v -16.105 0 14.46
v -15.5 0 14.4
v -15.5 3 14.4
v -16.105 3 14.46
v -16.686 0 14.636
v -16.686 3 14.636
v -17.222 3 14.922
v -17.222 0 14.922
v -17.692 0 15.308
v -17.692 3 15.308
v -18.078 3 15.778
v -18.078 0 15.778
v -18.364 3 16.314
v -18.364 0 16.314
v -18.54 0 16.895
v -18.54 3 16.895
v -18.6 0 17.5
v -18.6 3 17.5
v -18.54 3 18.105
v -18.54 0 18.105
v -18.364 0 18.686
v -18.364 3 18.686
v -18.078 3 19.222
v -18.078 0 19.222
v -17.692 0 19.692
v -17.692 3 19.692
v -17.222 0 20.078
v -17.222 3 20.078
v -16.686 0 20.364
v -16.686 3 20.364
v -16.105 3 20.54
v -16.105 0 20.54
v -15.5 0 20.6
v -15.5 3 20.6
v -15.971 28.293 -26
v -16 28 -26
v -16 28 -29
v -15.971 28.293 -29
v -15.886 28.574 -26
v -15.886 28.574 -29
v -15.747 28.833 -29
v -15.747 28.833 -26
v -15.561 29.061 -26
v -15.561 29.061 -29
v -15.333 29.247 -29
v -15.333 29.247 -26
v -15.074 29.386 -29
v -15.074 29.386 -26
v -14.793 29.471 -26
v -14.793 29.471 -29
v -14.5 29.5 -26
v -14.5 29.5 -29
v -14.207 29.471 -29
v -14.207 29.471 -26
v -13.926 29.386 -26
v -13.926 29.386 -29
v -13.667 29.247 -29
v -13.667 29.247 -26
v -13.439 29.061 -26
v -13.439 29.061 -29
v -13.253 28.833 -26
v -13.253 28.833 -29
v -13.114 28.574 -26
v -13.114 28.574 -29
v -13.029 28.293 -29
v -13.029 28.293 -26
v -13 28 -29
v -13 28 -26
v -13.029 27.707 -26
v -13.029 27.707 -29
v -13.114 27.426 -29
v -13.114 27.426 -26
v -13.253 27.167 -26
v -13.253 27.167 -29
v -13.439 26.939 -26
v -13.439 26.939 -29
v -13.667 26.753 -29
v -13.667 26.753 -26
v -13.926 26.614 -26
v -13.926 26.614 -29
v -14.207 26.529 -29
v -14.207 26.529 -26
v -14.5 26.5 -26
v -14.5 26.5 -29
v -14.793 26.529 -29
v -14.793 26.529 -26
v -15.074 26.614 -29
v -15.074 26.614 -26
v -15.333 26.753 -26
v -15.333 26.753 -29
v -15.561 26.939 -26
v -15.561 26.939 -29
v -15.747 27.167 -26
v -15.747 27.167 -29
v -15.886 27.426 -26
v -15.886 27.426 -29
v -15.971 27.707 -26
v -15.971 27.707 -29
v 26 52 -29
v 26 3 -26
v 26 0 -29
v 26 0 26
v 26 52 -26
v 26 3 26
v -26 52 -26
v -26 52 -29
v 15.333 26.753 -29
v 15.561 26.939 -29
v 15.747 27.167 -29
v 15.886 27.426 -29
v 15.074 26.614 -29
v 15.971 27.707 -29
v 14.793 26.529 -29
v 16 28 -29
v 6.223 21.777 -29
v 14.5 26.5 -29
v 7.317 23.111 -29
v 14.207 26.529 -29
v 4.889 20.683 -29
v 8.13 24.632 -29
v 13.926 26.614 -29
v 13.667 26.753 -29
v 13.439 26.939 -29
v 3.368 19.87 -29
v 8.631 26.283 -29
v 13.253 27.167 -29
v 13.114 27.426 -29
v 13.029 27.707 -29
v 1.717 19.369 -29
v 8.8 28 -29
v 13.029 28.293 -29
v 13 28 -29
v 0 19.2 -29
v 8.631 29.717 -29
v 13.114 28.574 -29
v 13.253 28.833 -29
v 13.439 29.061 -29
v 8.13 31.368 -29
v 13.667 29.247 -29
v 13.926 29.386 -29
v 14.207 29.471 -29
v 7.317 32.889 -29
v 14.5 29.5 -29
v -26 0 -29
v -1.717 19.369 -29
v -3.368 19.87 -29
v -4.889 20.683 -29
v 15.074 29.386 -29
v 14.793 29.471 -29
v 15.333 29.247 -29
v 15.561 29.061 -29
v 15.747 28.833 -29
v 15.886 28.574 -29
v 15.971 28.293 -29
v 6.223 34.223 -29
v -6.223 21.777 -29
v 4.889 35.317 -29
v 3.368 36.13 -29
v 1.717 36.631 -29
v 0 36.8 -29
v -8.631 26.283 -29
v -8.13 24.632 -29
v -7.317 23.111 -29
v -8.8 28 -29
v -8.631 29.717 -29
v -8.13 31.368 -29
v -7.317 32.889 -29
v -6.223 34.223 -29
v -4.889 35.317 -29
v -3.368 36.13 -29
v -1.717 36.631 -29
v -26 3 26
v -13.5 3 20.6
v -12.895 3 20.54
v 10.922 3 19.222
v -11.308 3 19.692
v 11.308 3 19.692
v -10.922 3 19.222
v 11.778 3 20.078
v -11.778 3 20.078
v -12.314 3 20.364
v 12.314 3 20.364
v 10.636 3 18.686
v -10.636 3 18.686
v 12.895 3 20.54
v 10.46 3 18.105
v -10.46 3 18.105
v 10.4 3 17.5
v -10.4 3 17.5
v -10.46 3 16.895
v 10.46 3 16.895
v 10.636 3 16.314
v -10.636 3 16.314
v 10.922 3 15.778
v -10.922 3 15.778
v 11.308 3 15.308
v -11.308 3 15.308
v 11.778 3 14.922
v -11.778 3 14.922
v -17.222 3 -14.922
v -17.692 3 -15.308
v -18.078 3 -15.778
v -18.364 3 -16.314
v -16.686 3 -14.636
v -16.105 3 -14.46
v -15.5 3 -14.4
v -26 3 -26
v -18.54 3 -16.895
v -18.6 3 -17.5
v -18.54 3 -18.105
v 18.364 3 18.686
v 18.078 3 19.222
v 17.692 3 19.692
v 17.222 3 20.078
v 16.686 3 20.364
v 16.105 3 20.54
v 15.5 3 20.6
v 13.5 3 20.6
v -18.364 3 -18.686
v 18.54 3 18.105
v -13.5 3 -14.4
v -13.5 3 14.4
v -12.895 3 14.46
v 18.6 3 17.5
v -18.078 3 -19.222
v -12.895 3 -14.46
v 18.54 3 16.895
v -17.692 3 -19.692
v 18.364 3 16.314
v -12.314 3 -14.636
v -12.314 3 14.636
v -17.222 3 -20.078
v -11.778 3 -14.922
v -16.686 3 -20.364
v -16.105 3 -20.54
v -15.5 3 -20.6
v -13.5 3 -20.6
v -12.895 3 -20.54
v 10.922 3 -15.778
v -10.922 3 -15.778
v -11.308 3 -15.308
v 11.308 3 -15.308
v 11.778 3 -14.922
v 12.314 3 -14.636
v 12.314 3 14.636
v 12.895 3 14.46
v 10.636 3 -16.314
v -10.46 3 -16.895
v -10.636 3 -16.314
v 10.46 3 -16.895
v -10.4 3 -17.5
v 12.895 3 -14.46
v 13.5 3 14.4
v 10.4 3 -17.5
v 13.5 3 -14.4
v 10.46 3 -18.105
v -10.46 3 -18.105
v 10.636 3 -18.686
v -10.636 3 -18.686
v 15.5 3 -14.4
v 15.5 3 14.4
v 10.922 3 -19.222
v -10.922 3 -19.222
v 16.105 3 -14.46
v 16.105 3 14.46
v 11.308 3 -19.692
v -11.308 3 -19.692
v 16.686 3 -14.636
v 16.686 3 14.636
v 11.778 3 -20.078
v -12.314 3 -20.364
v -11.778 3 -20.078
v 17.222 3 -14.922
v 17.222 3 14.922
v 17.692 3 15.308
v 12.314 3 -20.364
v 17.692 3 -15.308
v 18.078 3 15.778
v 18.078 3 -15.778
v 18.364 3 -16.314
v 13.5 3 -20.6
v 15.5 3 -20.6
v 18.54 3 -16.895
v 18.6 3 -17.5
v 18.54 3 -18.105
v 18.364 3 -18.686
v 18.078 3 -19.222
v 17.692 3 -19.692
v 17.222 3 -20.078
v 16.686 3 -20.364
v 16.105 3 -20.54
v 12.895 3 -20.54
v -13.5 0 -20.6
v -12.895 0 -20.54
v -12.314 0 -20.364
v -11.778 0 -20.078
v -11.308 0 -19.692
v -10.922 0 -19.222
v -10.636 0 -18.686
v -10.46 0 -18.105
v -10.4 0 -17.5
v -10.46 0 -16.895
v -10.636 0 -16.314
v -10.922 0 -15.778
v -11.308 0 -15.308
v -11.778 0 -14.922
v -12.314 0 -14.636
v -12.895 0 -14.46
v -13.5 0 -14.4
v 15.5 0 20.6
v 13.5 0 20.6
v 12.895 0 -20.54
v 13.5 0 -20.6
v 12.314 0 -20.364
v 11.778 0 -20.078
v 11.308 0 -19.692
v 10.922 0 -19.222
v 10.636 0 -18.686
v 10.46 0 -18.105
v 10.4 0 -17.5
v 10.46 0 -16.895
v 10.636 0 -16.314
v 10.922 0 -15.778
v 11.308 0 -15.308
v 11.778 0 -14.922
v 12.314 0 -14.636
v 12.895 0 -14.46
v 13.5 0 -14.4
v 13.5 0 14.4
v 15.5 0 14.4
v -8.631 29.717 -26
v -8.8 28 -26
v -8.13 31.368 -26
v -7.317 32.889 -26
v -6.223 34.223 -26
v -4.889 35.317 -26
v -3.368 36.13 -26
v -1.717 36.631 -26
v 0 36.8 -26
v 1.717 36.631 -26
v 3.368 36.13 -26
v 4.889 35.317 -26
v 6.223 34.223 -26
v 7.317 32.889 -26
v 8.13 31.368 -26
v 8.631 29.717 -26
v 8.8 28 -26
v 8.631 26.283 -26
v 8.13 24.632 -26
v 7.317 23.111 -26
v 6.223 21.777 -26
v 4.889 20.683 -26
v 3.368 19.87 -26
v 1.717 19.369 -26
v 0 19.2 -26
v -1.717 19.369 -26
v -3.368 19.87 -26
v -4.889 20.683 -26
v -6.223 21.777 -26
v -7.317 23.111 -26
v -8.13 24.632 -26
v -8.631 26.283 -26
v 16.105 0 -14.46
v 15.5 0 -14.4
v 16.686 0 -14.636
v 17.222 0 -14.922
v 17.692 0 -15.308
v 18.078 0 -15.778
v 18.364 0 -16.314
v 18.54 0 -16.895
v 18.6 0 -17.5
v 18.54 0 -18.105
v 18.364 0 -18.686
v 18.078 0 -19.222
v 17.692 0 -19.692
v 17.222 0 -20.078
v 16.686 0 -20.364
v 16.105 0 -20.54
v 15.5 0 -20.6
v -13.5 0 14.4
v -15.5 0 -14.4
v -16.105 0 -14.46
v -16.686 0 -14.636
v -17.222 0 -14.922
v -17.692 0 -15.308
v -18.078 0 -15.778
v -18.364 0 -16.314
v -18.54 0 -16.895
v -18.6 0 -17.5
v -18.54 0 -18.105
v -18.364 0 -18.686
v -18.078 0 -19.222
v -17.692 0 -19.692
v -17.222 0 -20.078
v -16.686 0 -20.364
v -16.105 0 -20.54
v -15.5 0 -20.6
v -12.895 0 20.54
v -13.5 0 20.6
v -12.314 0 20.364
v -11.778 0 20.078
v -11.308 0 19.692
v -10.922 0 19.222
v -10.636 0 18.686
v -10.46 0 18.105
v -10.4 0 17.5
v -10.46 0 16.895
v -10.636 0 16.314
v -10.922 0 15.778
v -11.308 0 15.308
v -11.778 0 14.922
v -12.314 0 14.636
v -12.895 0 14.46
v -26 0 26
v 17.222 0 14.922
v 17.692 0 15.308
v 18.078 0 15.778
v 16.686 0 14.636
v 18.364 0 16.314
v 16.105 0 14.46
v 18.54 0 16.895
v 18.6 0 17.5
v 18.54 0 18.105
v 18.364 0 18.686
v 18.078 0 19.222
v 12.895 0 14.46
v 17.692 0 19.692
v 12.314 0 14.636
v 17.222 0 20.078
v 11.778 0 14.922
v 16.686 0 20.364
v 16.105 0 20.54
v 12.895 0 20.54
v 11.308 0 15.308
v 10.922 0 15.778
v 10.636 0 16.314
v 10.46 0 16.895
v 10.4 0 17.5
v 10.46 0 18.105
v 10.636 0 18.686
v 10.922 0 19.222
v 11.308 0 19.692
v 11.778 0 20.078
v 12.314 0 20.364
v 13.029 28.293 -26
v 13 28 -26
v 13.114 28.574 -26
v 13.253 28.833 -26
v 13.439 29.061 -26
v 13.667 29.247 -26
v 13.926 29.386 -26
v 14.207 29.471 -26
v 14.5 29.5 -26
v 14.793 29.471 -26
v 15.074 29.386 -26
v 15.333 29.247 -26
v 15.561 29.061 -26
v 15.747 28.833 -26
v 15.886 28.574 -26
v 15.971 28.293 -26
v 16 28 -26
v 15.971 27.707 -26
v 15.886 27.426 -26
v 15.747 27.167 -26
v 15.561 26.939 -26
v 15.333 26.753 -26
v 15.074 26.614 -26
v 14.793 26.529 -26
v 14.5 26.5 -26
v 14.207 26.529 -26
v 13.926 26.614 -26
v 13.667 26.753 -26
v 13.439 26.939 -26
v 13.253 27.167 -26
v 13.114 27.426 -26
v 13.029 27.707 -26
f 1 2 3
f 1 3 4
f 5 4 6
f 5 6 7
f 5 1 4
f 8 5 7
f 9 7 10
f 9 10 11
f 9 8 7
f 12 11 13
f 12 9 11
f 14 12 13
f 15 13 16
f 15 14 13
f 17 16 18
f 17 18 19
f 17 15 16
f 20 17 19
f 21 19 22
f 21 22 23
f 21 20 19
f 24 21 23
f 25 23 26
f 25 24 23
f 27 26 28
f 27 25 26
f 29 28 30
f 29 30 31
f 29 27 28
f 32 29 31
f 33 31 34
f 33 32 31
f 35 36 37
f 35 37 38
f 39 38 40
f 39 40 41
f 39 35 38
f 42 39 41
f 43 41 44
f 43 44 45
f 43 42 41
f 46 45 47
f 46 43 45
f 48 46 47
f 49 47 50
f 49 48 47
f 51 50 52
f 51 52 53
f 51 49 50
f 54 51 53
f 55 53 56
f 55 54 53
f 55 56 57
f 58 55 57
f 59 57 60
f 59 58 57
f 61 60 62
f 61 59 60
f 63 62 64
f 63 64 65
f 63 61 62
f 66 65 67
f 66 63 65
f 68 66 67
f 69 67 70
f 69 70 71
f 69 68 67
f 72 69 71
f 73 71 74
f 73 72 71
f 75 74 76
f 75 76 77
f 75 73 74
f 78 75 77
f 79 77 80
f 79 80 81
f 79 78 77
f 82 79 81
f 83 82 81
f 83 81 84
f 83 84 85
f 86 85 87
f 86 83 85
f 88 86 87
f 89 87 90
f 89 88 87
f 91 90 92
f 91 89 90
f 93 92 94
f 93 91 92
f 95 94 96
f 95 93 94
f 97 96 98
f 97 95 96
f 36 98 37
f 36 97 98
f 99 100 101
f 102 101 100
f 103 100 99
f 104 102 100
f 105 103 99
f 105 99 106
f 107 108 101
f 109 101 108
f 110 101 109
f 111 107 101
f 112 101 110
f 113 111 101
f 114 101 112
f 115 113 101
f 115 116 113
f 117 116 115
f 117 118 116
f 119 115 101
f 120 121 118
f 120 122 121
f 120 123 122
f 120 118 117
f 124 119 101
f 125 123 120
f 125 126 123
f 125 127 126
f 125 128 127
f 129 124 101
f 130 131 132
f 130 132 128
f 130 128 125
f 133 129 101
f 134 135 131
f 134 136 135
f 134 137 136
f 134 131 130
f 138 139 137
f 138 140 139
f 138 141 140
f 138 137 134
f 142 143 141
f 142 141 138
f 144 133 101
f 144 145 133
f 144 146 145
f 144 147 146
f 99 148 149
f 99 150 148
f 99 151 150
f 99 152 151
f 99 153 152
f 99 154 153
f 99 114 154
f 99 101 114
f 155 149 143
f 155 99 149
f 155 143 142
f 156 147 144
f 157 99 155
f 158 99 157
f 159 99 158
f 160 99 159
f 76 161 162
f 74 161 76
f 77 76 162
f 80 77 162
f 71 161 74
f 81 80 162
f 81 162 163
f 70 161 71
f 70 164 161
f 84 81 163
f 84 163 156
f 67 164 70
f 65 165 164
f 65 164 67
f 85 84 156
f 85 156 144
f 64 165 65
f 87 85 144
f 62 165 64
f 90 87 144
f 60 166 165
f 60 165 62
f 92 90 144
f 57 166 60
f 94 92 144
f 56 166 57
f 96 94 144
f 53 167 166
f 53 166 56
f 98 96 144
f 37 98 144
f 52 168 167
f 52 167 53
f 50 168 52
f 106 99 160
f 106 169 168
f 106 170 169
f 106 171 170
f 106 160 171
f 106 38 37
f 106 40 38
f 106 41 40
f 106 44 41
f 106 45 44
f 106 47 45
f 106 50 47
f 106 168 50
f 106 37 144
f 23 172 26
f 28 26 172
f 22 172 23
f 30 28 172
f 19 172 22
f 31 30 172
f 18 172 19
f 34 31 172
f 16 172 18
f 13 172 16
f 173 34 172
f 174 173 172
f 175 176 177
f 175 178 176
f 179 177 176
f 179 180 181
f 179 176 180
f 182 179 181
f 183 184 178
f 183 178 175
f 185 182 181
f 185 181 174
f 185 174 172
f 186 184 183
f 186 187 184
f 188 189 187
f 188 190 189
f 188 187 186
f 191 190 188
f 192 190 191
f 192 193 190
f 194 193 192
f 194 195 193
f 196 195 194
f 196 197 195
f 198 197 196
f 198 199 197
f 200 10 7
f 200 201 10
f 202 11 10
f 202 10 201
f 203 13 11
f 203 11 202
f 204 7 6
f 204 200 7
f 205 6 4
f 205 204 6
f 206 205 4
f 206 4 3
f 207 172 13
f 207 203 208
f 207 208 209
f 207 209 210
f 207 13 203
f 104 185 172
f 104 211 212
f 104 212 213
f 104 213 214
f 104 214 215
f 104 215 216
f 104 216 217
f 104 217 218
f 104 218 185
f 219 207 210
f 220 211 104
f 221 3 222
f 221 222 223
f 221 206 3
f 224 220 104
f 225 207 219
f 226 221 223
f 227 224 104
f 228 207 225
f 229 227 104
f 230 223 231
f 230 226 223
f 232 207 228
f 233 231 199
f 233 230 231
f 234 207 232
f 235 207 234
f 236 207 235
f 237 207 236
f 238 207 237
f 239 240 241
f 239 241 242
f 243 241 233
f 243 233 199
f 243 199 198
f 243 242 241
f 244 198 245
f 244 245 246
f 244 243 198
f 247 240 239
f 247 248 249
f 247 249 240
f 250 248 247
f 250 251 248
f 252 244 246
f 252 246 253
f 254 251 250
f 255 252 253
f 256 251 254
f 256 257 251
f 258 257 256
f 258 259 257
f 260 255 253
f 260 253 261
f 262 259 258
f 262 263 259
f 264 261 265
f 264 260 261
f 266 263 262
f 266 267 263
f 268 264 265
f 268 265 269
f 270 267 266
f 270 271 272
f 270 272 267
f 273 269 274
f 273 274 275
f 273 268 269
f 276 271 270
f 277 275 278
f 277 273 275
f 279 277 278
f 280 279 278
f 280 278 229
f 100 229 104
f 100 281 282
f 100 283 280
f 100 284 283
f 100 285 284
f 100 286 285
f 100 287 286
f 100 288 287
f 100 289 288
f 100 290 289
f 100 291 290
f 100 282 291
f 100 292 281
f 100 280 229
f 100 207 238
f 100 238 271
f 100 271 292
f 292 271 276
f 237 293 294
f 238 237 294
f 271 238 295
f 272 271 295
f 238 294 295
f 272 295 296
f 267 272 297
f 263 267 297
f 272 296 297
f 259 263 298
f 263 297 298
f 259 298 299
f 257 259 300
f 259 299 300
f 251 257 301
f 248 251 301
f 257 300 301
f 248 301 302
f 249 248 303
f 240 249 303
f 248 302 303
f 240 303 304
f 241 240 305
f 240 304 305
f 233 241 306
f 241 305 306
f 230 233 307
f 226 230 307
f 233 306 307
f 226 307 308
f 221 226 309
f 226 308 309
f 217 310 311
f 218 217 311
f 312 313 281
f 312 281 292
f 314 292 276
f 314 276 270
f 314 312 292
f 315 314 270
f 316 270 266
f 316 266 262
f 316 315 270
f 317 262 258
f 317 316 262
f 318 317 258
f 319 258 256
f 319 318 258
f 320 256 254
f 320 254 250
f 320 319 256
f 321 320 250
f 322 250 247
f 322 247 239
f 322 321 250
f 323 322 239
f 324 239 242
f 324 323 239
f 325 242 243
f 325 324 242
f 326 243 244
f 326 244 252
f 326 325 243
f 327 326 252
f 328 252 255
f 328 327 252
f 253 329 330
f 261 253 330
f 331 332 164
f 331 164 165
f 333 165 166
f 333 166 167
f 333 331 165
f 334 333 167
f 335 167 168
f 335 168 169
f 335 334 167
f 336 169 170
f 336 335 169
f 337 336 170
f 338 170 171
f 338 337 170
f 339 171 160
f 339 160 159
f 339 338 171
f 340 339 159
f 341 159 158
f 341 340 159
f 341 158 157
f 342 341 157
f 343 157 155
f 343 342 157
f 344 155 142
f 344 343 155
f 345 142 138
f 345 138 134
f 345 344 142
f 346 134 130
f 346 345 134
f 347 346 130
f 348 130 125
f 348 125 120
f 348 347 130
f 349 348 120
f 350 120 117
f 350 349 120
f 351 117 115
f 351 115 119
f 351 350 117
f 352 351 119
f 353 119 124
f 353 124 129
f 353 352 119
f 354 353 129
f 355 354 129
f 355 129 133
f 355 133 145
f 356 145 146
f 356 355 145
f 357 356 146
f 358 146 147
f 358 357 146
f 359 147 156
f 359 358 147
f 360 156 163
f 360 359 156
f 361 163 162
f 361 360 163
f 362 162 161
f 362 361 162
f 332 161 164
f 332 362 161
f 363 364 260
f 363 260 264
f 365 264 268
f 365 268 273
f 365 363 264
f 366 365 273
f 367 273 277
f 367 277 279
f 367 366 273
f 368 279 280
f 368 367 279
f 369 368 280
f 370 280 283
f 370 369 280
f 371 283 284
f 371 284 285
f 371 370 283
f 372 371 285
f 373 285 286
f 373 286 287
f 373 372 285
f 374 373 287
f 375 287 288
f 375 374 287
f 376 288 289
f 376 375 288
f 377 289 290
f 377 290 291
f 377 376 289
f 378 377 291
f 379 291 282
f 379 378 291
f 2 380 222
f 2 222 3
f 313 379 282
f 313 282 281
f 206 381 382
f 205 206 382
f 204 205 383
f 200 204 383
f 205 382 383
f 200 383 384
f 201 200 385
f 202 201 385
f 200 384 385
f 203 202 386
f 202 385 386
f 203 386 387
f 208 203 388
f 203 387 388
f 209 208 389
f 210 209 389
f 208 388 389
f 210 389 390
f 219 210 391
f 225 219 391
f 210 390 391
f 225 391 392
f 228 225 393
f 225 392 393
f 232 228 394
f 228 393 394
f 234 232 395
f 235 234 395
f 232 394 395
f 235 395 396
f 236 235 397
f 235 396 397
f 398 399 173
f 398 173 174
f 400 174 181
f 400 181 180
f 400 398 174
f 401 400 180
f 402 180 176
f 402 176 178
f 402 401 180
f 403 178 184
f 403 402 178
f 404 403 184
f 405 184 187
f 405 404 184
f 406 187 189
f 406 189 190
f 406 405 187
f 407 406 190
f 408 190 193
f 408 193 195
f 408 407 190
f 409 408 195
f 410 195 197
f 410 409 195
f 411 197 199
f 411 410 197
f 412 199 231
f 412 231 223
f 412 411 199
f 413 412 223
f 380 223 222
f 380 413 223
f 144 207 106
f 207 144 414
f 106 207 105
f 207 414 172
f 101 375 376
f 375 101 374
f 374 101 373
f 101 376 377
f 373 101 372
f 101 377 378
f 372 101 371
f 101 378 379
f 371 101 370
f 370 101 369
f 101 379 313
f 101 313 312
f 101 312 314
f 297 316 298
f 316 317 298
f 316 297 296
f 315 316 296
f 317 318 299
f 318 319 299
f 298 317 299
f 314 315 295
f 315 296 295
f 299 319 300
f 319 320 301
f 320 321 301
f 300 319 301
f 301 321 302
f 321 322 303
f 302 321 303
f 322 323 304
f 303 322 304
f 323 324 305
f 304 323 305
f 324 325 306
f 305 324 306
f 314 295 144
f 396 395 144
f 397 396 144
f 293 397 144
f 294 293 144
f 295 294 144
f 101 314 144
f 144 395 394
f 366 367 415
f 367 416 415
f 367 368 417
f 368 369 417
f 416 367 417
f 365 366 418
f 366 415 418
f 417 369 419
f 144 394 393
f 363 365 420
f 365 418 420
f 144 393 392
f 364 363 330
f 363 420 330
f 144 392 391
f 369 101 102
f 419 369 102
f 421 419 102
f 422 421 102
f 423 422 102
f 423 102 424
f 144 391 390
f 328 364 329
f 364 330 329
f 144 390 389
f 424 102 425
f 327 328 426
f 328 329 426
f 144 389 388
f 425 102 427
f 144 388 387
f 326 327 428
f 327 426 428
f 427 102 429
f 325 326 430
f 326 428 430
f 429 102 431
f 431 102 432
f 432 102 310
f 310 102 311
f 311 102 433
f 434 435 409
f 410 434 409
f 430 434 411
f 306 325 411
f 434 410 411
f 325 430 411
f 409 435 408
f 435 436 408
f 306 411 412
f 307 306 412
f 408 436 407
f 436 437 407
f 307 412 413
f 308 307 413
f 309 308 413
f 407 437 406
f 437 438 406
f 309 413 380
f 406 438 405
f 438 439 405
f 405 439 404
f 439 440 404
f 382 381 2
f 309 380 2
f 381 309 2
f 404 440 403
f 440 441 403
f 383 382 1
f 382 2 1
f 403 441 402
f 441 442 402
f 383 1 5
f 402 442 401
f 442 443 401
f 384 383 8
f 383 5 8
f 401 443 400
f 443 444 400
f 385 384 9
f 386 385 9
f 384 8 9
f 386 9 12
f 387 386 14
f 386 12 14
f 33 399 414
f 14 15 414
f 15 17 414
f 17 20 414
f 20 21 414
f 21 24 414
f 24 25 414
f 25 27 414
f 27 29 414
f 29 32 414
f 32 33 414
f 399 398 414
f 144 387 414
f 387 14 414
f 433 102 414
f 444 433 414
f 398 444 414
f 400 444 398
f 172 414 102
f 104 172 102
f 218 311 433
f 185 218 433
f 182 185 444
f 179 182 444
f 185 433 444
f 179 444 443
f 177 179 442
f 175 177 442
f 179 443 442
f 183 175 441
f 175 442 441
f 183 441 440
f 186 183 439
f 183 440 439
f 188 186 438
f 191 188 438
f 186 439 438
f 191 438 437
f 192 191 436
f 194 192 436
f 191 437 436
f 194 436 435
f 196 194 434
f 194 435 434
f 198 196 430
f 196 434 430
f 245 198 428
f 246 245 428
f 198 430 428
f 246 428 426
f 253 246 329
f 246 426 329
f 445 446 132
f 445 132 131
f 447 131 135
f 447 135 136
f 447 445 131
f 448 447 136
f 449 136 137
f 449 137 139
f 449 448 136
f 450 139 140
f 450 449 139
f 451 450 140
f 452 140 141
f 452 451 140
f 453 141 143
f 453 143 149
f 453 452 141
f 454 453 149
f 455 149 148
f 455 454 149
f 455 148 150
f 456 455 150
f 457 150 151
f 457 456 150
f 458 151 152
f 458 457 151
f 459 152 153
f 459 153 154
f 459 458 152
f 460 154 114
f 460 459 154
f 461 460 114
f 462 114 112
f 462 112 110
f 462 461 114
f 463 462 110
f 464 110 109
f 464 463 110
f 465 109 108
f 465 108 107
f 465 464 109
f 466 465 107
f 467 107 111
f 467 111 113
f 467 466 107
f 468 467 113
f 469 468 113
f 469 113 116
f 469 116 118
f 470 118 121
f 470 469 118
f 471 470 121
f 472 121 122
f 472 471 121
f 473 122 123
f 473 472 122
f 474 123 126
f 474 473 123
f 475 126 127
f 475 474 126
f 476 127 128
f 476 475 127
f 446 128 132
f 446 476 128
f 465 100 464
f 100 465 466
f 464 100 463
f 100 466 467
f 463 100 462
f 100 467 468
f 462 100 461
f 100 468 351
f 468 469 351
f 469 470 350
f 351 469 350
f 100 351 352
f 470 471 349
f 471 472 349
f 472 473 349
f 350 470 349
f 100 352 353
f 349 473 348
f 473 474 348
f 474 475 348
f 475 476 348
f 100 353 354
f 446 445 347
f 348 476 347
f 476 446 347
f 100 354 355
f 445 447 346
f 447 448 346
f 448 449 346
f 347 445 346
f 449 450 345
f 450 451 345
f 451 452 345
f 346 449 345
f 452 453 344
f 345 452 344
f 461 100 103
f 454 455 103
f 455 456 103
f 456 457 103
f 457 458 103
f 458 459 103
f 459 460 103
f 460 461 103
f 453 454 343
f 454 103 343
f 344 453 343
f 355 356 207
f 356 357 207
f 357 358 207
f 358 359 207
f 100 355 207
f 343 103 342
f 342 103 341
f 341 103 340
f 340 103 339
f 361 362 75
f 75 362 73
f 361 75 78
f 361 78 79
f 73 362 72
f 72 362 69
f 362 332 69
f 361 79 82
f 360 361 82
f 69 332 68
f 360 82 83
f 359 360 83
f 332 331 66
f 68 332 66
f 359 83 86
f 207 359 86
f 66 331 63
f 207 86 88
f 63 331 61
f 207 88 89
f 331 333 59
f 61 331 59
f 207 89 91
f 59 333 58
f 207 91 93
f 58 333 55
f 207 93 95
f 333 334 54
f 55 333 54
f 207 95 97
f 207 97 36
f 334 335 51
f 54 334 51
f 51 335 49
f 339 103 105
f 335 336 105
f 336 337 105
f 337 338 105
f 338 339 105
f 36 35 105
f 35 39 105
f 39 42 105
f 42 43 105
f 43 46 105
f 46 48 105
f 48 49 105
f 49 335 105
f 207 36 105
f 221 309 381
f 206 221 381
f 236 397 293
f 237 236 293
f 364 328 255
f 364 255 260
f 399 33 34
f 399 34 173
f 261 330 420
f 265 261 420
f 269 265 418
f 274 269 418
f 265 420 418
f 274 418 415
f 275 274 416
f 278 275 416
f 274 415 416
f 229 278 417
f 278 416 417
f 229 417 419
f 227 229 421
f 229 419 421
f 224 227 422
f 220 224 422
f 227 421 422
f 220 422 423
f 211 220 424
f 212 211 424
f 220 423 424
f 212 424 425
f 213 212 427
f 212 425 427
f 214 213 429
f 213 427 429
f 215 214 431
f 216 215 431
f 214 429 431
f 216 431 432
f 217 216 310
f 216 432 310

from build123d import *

# Parameters (mm, degrees)
SKETCH_1_W      = 52
SKETCH_1_H      = 52
EXTRUDE_1_DEPTH = 3
SKETCH_2_W      = 52
SKETCH_2_H      = 52
SKETCH_2_R      = 1.5
SKETCH_2_R_2    = 8.8
EXTRUDE_2_DEPTH = 3


with BuildPart() as part:
    # 草圖1 → 填料-伸長1 (new body)
    with BuildSketch(Plane(origin=(0, 0, 0), x_dir=(1, 0, 0), z_dir=(0, 1, 0))):
        Rectangle(SKETCH_1_W, SKETCH_1_H)
        with BuildLine():
            Line((-15.5, 20.6), (-13.5, 20.6))
            ThreePointArc((-13.5, 20.6), (-10.4, 17.5), (-13.5, 14.4))
            Line((-13.5, 14.4), (-15.5, 14.4))
            ThreePointArc((-15.5, 14.4), (-18.6, 17.5), (-15.5, 20.6))
        make_face(mode=Mode.SUBTRACT)
        with BuildLine():
            Line((15.5, 20.6), (13.5, 20.6))
            ThreePointArc((13.5, 20.6), (10.4, 17.5), (13.5, 14.4))
            Line((13.5, 14.4), (15.5, 14.4))
            ThreePointArc((15.5, 14.4), (18.6, 17.5), (15.5, 20.6))
        make_face(mode=Mode.SUBTRACT)
        with BuildLine():
            Line((15.5, -20.6), (13.5, -20.6))
            ThreePointArc((13.5, -20.6), (10.4, -17.5), (13.5, -14.4))
            Line((13.5, -14.4), (15.5, -14.4))
            ThreePointArc((15.5, -14.4), (18.6, -17.5), (15.5, -20.6))
        make_face(mode=Mode.SUBTRACT)
        with BuildLine():
            Line((-15.5, -20.6), (-13.5, -20.6))
            ThreePointArc((-13.5, -20.6), (-10.4, -17.5), (-13.5, -14.4))
            Line((-13.5, -14.4), (-15.5, -14.4))
            ThreePointArc((-15.5, -14.4), (-18.6, -17.5), (-15.5, -20.6))
        make_face(mode=Mode.SUBTRACT)
    extrude(amount=EXTRUDE_1_DEPTH)

    # 草圖2 → 填料-伸長2 (add)
    with BuildSketch(Plane(origin=(0, 0, -26), x_dir=(-1, 0, 0), z_dir=(0, 0, -1))):
        with Locations((0, 26)):
            Rectangle(SKETCH_2_W, SKETCH_2_H)
        with Locations((-14.5, 28)):
            Circle(SKETCH_2_R, mode=Mode.SUBTRACT)
        with Locations((14.5, 28)):
            Circle(SKETCH_2_R, mode=Mode.SUBTRACT)
        with Locations((0, 28)):
            Circle(SKETCH_2_R_2, mode=Mode.SUBTRACT)
    extrude(amount=EXTRUDE_2_DEPTH)


solid = part.part
